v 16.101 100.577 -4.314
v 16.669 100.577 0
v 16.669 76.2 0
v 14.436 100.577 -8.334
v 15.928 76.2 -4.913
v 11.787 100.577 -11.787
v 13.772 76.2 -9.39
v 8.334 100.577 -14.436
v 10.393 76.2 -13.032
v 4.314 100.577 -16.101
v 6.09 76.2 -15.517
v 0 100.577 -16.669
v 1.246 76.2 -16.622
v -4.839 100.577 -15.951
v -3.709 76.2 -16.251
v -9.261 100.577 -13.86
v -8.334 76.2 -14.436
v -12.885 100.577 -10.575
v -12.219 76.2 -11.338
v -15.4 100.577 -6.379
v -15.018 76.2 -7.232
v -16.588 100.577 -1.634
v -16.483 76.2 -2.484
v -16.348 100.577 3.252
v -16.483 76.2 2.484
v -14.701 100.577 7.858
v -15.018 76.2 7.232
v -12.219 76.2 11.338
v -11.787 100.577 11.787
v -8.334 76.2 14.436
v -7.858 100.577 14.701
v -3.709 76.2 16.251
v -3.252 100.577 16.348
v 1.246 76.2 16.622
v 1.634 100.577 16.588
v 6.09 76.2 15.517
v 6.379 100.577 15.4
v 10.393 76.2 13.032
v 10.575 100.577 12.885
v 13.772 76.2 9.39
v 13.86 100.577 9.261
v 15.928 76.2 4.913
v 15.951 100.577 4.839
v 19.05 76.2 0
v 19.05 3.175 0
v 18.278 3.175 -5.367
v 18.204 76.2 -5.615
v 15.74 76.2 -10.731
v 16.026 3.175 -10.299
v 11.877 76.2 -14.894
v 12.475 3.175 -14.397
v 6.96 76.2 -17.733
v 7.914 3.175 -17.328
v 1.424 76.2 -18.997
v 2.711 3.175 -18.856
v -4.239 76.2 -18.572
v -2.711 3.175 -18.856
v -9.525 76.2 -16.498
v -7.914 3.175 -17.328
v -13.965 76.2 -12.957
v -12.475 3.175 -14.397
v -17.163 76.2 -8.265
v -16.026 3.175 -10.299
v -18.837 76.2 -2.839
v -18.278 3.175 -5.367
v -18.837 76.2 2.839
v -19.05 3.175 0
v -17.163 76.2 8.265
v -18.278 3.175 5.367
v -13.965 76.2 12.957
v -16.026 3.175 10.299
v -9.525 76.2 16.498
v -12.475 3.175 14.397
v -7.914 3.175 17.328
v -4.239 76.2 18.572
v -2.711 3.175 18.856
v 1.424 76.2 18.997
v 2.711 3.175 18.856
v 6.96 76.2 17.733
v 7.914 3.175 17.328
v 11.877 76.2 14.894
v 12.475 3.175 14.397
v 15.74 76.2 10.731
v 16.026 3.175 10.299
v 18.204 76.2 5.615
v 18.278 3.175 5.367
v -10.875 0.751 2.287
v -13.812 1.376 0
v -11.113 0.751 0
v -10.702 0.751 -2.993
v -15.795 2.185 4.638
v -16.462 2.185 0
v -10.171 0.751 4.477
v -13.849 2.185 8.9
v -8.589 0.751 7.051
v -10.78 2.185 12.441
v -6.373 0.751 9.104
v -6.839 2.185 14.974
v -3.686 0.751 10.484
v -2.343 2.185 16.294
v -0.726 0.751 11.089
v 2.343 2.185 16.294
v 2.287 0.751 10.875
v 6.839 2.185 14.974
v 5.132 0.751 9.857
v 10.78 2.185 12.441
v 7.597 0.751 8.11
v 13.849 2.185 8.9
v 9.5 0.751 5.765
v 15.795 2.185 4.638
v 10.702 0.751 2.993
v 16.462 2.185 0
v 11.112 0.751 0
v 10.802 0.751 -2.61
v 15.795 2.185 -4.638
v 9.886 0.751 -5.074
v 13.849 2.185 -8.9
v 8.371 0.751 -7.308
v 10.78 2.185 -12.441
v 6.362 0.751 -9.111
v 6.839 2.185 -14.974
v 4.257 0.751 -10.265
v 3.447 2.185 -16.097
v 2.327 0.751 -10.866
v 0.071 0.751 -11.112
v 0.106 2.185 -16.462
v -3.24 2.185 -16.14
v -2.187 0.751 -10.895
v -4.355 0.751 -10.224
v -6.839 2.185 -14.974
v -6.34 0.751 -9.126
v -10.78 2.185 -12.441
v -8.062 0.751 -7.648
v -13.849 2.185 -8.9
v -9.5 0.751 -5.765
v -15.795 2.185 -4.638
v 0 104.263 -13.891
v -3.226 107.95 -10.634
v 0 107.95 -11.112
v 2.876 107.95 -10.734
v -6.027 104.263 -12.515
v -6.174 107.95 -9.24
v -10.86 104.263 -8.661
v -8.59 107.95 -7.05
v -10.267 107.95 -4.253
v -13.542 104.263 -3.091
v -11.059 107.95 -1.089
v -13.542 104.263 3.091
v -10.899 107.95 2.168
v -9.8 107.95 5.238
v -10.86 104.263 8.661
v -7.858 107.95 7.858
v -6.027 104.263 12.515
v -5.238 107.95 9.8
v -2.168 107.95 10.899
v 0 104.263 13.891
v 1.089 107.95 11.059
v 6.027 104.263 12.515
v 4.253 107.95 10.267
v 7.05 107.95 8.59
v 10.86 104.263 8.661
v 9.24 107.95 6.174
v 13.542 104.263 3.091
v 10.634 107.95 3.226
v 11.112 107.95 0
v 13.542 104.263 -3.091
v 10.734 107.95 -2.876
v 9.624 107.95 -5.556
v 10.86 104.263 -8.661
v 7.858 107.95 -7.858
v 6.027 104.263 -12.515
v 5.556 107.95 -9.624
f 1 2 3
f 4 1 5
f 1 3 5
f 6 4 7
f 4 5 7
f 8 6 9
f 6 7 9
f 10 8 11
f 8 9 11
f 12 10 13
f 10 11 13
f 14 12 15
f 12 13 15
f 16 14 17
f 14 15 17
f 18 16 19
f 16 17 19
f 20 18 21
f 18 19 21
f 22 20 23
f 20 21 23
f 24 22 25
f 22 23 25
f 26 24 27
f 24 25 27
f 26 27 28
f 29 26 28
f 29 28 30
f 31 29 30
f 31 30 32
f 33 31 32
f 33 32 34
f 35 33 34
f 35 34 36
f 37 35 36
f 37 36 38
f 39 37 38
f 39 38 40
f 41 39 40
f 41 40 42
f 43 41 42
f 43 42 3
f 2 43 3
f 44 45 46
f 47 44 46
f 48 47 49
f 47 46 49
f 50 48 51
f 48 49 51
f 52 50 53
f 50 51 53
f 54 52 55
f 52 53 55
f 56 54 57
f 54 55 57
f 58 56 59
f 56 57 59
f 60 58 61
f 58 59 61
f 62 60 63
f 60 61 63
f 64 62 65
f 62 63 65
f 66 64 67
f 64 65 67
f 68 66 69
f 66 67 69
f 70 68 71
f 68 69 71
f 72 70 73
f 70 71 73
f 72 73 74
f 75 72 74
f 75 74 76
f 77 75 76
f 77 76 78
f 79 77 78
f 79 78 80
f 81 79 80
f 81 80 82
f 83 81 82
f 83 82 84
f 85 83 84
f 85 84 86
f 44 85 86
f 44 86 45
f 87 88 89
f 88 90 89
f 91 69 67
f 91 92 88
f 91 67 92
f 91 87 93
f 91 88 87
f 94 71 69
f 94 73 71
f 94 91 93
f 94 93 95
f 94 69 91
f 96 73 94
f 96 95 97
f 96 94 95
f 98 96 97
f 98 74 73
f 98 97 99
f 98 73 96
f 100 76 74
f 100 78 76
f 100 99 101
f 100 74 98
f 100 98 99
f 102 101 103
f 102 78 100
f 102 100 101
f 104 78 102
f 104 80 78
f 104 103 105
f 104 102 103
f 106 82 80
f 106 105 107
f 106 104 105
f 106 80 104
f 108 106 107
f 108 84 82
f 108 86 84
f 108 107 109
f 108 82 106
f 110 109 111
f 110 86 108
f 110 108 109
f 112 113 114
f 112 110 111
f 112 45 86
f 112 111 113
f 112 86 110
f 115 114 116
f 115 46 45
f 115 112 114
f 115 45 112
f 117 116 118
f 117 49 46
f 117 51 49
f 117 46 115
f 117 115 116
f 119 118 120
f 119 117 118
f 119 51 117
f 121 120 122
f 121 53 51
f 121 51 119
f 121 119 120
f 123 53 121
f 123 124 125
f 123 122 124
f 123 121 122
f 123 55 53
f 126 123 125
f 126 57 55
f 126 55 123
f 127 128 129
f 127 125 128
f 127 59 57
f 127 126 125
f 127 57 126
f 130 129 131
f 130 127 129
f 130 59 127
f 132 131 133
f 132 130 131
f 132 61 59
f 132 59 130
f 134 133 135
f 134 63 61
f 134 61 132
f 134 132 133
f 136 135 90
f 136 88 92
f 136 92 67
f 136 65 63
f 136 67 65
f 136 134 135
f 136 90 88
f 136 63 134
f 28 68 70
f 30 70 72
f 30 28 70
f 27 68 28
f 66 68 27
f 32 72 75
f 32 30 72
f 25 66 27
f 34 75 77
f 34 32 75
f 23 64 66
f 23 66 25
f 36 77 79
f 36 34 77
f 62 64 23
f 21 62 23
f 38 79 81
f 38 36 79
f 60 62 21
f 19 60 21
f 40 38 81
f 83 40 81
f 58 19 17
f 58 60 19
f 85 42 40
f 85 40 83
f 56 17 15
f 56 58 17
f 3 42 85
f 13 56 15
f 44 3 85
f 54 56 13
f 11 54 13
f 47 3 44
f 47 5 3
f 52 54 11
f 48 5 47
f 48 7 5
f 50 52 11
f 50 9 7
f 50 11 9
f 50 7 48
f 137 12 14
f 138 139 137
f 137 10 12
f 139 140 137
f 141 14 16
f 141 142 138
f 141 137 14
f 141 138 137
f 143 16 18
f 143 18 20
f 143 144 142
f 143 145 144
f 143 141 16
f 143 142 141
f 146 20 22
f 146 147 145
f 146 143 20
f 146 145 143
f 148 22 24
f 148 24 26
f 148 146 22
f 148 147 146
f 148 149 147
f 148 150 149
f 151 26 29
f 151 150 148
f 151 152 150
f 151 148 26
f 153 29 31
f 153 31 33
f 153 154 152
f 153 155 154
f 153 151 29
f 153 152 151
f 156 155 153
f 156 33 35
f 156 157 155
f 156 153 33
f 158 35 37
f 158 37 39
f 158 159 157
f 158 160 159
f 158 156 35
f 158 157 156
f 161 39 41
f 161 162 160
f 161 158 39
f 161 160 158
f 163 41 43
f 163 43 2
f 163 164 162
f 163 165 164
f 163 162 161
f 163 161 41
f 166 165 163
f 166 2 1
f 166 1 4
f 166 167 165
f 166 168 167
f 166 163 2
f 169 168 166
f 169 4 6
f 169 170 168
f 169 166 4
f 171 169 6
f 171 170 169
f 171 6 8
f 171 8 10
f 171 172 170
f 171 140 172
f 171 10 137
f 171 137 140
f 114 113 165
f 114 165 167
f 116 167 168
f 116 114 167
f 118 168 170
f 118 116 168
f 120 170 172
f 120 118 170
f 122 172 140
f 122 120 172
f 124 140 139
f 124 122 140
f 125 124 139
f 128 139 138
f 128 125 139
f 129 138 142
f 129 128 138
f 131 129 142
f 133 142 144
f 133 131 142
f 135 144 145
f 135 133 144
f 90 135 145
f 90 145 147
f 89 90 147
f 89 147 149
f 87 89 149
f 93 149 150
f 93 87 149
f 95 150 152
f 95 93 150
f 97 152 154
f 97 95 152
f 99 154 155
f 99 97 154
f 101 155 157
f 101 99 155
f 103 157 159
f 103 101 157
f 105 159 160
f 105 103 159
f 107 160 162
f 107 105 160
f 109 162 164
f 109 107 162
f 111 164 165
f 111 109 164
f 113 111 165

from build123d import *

# Parameters (mm, degrees)
SKETCH1_R           = 19.05
SKETCH1_R_2         = 11.1125
BOSS_EXTRUDE1_DEPTH = 76.2
SKETCH2_R           = 16.66875
SKETCH2_R_2         = 11.1125
BOSS_EXTRUDE2_DEPTH = 31.75


with BuildPart() as part:
    # Sketch1 → Boss-Extrude1 (new body)
    with BuildSketch(Plane(origin=(0, 0, 0), x_dir=(1, 0, 0), z_dir=(0, 1, 0))):
        Circle(SKETCH1_R)
        Circle(SKETCH1_R_2, mode=Mode.SUBTRACT)
    extrude(amount=BOSS_EXTRUDE1_DEPTH)

    # Sketch2 → Boss-Extrude2 (add)
    with BuildSketch(Plane(origin=(0, 76.2, 0), x_dir=(1, 0, 0), z_dir=(0, 1, 0))):
        Circle(SKETCH2_R)
        Circle(SKETCH2_R_2, mode=Mode.SUBTRACT)
    extrude(amount=BOSS_EXTRUDE2_DEPTH)

    # Sketch3 → Cut-Revolve1 (revolve, cut)
    with BuildSketch(Plane(origin=(0, 0, 0), x_dir=(0, 0, -1), z_dir=(1, 0, 0))):
        Polygon((16.66875, 107.95), (16.66875, 100.57660721), (11.1125, 107.95), align=None)
    revolve(axis=Axis((0, 107.95, 0), (0, 1, 0)), mode=Mode.SUBTRACT)

    # Sketch8 → Cut-Revolve4 (revolve, cut)
    with BuildSketch(Plane.XY):
        with BuildLine():
            Line((0, 0), (-3.369464108, 0))
            ThreePointArc((-3.369464108, 0), (-11.368836441, 0.801722978), (-19.05, 3.175))
            Line((-19.05, 3.175), (-19.05, -4.469484217))
            Line((-19.05, -4.469484217), (0, -4.469484217))
            Line((0, -4.469484217), (0, 0))
        make_face()
    revolve(axis=Axis((0, 0, 0), (0, 1, 0)), mode=Mode.SUBTRACT)


solid = part.part
